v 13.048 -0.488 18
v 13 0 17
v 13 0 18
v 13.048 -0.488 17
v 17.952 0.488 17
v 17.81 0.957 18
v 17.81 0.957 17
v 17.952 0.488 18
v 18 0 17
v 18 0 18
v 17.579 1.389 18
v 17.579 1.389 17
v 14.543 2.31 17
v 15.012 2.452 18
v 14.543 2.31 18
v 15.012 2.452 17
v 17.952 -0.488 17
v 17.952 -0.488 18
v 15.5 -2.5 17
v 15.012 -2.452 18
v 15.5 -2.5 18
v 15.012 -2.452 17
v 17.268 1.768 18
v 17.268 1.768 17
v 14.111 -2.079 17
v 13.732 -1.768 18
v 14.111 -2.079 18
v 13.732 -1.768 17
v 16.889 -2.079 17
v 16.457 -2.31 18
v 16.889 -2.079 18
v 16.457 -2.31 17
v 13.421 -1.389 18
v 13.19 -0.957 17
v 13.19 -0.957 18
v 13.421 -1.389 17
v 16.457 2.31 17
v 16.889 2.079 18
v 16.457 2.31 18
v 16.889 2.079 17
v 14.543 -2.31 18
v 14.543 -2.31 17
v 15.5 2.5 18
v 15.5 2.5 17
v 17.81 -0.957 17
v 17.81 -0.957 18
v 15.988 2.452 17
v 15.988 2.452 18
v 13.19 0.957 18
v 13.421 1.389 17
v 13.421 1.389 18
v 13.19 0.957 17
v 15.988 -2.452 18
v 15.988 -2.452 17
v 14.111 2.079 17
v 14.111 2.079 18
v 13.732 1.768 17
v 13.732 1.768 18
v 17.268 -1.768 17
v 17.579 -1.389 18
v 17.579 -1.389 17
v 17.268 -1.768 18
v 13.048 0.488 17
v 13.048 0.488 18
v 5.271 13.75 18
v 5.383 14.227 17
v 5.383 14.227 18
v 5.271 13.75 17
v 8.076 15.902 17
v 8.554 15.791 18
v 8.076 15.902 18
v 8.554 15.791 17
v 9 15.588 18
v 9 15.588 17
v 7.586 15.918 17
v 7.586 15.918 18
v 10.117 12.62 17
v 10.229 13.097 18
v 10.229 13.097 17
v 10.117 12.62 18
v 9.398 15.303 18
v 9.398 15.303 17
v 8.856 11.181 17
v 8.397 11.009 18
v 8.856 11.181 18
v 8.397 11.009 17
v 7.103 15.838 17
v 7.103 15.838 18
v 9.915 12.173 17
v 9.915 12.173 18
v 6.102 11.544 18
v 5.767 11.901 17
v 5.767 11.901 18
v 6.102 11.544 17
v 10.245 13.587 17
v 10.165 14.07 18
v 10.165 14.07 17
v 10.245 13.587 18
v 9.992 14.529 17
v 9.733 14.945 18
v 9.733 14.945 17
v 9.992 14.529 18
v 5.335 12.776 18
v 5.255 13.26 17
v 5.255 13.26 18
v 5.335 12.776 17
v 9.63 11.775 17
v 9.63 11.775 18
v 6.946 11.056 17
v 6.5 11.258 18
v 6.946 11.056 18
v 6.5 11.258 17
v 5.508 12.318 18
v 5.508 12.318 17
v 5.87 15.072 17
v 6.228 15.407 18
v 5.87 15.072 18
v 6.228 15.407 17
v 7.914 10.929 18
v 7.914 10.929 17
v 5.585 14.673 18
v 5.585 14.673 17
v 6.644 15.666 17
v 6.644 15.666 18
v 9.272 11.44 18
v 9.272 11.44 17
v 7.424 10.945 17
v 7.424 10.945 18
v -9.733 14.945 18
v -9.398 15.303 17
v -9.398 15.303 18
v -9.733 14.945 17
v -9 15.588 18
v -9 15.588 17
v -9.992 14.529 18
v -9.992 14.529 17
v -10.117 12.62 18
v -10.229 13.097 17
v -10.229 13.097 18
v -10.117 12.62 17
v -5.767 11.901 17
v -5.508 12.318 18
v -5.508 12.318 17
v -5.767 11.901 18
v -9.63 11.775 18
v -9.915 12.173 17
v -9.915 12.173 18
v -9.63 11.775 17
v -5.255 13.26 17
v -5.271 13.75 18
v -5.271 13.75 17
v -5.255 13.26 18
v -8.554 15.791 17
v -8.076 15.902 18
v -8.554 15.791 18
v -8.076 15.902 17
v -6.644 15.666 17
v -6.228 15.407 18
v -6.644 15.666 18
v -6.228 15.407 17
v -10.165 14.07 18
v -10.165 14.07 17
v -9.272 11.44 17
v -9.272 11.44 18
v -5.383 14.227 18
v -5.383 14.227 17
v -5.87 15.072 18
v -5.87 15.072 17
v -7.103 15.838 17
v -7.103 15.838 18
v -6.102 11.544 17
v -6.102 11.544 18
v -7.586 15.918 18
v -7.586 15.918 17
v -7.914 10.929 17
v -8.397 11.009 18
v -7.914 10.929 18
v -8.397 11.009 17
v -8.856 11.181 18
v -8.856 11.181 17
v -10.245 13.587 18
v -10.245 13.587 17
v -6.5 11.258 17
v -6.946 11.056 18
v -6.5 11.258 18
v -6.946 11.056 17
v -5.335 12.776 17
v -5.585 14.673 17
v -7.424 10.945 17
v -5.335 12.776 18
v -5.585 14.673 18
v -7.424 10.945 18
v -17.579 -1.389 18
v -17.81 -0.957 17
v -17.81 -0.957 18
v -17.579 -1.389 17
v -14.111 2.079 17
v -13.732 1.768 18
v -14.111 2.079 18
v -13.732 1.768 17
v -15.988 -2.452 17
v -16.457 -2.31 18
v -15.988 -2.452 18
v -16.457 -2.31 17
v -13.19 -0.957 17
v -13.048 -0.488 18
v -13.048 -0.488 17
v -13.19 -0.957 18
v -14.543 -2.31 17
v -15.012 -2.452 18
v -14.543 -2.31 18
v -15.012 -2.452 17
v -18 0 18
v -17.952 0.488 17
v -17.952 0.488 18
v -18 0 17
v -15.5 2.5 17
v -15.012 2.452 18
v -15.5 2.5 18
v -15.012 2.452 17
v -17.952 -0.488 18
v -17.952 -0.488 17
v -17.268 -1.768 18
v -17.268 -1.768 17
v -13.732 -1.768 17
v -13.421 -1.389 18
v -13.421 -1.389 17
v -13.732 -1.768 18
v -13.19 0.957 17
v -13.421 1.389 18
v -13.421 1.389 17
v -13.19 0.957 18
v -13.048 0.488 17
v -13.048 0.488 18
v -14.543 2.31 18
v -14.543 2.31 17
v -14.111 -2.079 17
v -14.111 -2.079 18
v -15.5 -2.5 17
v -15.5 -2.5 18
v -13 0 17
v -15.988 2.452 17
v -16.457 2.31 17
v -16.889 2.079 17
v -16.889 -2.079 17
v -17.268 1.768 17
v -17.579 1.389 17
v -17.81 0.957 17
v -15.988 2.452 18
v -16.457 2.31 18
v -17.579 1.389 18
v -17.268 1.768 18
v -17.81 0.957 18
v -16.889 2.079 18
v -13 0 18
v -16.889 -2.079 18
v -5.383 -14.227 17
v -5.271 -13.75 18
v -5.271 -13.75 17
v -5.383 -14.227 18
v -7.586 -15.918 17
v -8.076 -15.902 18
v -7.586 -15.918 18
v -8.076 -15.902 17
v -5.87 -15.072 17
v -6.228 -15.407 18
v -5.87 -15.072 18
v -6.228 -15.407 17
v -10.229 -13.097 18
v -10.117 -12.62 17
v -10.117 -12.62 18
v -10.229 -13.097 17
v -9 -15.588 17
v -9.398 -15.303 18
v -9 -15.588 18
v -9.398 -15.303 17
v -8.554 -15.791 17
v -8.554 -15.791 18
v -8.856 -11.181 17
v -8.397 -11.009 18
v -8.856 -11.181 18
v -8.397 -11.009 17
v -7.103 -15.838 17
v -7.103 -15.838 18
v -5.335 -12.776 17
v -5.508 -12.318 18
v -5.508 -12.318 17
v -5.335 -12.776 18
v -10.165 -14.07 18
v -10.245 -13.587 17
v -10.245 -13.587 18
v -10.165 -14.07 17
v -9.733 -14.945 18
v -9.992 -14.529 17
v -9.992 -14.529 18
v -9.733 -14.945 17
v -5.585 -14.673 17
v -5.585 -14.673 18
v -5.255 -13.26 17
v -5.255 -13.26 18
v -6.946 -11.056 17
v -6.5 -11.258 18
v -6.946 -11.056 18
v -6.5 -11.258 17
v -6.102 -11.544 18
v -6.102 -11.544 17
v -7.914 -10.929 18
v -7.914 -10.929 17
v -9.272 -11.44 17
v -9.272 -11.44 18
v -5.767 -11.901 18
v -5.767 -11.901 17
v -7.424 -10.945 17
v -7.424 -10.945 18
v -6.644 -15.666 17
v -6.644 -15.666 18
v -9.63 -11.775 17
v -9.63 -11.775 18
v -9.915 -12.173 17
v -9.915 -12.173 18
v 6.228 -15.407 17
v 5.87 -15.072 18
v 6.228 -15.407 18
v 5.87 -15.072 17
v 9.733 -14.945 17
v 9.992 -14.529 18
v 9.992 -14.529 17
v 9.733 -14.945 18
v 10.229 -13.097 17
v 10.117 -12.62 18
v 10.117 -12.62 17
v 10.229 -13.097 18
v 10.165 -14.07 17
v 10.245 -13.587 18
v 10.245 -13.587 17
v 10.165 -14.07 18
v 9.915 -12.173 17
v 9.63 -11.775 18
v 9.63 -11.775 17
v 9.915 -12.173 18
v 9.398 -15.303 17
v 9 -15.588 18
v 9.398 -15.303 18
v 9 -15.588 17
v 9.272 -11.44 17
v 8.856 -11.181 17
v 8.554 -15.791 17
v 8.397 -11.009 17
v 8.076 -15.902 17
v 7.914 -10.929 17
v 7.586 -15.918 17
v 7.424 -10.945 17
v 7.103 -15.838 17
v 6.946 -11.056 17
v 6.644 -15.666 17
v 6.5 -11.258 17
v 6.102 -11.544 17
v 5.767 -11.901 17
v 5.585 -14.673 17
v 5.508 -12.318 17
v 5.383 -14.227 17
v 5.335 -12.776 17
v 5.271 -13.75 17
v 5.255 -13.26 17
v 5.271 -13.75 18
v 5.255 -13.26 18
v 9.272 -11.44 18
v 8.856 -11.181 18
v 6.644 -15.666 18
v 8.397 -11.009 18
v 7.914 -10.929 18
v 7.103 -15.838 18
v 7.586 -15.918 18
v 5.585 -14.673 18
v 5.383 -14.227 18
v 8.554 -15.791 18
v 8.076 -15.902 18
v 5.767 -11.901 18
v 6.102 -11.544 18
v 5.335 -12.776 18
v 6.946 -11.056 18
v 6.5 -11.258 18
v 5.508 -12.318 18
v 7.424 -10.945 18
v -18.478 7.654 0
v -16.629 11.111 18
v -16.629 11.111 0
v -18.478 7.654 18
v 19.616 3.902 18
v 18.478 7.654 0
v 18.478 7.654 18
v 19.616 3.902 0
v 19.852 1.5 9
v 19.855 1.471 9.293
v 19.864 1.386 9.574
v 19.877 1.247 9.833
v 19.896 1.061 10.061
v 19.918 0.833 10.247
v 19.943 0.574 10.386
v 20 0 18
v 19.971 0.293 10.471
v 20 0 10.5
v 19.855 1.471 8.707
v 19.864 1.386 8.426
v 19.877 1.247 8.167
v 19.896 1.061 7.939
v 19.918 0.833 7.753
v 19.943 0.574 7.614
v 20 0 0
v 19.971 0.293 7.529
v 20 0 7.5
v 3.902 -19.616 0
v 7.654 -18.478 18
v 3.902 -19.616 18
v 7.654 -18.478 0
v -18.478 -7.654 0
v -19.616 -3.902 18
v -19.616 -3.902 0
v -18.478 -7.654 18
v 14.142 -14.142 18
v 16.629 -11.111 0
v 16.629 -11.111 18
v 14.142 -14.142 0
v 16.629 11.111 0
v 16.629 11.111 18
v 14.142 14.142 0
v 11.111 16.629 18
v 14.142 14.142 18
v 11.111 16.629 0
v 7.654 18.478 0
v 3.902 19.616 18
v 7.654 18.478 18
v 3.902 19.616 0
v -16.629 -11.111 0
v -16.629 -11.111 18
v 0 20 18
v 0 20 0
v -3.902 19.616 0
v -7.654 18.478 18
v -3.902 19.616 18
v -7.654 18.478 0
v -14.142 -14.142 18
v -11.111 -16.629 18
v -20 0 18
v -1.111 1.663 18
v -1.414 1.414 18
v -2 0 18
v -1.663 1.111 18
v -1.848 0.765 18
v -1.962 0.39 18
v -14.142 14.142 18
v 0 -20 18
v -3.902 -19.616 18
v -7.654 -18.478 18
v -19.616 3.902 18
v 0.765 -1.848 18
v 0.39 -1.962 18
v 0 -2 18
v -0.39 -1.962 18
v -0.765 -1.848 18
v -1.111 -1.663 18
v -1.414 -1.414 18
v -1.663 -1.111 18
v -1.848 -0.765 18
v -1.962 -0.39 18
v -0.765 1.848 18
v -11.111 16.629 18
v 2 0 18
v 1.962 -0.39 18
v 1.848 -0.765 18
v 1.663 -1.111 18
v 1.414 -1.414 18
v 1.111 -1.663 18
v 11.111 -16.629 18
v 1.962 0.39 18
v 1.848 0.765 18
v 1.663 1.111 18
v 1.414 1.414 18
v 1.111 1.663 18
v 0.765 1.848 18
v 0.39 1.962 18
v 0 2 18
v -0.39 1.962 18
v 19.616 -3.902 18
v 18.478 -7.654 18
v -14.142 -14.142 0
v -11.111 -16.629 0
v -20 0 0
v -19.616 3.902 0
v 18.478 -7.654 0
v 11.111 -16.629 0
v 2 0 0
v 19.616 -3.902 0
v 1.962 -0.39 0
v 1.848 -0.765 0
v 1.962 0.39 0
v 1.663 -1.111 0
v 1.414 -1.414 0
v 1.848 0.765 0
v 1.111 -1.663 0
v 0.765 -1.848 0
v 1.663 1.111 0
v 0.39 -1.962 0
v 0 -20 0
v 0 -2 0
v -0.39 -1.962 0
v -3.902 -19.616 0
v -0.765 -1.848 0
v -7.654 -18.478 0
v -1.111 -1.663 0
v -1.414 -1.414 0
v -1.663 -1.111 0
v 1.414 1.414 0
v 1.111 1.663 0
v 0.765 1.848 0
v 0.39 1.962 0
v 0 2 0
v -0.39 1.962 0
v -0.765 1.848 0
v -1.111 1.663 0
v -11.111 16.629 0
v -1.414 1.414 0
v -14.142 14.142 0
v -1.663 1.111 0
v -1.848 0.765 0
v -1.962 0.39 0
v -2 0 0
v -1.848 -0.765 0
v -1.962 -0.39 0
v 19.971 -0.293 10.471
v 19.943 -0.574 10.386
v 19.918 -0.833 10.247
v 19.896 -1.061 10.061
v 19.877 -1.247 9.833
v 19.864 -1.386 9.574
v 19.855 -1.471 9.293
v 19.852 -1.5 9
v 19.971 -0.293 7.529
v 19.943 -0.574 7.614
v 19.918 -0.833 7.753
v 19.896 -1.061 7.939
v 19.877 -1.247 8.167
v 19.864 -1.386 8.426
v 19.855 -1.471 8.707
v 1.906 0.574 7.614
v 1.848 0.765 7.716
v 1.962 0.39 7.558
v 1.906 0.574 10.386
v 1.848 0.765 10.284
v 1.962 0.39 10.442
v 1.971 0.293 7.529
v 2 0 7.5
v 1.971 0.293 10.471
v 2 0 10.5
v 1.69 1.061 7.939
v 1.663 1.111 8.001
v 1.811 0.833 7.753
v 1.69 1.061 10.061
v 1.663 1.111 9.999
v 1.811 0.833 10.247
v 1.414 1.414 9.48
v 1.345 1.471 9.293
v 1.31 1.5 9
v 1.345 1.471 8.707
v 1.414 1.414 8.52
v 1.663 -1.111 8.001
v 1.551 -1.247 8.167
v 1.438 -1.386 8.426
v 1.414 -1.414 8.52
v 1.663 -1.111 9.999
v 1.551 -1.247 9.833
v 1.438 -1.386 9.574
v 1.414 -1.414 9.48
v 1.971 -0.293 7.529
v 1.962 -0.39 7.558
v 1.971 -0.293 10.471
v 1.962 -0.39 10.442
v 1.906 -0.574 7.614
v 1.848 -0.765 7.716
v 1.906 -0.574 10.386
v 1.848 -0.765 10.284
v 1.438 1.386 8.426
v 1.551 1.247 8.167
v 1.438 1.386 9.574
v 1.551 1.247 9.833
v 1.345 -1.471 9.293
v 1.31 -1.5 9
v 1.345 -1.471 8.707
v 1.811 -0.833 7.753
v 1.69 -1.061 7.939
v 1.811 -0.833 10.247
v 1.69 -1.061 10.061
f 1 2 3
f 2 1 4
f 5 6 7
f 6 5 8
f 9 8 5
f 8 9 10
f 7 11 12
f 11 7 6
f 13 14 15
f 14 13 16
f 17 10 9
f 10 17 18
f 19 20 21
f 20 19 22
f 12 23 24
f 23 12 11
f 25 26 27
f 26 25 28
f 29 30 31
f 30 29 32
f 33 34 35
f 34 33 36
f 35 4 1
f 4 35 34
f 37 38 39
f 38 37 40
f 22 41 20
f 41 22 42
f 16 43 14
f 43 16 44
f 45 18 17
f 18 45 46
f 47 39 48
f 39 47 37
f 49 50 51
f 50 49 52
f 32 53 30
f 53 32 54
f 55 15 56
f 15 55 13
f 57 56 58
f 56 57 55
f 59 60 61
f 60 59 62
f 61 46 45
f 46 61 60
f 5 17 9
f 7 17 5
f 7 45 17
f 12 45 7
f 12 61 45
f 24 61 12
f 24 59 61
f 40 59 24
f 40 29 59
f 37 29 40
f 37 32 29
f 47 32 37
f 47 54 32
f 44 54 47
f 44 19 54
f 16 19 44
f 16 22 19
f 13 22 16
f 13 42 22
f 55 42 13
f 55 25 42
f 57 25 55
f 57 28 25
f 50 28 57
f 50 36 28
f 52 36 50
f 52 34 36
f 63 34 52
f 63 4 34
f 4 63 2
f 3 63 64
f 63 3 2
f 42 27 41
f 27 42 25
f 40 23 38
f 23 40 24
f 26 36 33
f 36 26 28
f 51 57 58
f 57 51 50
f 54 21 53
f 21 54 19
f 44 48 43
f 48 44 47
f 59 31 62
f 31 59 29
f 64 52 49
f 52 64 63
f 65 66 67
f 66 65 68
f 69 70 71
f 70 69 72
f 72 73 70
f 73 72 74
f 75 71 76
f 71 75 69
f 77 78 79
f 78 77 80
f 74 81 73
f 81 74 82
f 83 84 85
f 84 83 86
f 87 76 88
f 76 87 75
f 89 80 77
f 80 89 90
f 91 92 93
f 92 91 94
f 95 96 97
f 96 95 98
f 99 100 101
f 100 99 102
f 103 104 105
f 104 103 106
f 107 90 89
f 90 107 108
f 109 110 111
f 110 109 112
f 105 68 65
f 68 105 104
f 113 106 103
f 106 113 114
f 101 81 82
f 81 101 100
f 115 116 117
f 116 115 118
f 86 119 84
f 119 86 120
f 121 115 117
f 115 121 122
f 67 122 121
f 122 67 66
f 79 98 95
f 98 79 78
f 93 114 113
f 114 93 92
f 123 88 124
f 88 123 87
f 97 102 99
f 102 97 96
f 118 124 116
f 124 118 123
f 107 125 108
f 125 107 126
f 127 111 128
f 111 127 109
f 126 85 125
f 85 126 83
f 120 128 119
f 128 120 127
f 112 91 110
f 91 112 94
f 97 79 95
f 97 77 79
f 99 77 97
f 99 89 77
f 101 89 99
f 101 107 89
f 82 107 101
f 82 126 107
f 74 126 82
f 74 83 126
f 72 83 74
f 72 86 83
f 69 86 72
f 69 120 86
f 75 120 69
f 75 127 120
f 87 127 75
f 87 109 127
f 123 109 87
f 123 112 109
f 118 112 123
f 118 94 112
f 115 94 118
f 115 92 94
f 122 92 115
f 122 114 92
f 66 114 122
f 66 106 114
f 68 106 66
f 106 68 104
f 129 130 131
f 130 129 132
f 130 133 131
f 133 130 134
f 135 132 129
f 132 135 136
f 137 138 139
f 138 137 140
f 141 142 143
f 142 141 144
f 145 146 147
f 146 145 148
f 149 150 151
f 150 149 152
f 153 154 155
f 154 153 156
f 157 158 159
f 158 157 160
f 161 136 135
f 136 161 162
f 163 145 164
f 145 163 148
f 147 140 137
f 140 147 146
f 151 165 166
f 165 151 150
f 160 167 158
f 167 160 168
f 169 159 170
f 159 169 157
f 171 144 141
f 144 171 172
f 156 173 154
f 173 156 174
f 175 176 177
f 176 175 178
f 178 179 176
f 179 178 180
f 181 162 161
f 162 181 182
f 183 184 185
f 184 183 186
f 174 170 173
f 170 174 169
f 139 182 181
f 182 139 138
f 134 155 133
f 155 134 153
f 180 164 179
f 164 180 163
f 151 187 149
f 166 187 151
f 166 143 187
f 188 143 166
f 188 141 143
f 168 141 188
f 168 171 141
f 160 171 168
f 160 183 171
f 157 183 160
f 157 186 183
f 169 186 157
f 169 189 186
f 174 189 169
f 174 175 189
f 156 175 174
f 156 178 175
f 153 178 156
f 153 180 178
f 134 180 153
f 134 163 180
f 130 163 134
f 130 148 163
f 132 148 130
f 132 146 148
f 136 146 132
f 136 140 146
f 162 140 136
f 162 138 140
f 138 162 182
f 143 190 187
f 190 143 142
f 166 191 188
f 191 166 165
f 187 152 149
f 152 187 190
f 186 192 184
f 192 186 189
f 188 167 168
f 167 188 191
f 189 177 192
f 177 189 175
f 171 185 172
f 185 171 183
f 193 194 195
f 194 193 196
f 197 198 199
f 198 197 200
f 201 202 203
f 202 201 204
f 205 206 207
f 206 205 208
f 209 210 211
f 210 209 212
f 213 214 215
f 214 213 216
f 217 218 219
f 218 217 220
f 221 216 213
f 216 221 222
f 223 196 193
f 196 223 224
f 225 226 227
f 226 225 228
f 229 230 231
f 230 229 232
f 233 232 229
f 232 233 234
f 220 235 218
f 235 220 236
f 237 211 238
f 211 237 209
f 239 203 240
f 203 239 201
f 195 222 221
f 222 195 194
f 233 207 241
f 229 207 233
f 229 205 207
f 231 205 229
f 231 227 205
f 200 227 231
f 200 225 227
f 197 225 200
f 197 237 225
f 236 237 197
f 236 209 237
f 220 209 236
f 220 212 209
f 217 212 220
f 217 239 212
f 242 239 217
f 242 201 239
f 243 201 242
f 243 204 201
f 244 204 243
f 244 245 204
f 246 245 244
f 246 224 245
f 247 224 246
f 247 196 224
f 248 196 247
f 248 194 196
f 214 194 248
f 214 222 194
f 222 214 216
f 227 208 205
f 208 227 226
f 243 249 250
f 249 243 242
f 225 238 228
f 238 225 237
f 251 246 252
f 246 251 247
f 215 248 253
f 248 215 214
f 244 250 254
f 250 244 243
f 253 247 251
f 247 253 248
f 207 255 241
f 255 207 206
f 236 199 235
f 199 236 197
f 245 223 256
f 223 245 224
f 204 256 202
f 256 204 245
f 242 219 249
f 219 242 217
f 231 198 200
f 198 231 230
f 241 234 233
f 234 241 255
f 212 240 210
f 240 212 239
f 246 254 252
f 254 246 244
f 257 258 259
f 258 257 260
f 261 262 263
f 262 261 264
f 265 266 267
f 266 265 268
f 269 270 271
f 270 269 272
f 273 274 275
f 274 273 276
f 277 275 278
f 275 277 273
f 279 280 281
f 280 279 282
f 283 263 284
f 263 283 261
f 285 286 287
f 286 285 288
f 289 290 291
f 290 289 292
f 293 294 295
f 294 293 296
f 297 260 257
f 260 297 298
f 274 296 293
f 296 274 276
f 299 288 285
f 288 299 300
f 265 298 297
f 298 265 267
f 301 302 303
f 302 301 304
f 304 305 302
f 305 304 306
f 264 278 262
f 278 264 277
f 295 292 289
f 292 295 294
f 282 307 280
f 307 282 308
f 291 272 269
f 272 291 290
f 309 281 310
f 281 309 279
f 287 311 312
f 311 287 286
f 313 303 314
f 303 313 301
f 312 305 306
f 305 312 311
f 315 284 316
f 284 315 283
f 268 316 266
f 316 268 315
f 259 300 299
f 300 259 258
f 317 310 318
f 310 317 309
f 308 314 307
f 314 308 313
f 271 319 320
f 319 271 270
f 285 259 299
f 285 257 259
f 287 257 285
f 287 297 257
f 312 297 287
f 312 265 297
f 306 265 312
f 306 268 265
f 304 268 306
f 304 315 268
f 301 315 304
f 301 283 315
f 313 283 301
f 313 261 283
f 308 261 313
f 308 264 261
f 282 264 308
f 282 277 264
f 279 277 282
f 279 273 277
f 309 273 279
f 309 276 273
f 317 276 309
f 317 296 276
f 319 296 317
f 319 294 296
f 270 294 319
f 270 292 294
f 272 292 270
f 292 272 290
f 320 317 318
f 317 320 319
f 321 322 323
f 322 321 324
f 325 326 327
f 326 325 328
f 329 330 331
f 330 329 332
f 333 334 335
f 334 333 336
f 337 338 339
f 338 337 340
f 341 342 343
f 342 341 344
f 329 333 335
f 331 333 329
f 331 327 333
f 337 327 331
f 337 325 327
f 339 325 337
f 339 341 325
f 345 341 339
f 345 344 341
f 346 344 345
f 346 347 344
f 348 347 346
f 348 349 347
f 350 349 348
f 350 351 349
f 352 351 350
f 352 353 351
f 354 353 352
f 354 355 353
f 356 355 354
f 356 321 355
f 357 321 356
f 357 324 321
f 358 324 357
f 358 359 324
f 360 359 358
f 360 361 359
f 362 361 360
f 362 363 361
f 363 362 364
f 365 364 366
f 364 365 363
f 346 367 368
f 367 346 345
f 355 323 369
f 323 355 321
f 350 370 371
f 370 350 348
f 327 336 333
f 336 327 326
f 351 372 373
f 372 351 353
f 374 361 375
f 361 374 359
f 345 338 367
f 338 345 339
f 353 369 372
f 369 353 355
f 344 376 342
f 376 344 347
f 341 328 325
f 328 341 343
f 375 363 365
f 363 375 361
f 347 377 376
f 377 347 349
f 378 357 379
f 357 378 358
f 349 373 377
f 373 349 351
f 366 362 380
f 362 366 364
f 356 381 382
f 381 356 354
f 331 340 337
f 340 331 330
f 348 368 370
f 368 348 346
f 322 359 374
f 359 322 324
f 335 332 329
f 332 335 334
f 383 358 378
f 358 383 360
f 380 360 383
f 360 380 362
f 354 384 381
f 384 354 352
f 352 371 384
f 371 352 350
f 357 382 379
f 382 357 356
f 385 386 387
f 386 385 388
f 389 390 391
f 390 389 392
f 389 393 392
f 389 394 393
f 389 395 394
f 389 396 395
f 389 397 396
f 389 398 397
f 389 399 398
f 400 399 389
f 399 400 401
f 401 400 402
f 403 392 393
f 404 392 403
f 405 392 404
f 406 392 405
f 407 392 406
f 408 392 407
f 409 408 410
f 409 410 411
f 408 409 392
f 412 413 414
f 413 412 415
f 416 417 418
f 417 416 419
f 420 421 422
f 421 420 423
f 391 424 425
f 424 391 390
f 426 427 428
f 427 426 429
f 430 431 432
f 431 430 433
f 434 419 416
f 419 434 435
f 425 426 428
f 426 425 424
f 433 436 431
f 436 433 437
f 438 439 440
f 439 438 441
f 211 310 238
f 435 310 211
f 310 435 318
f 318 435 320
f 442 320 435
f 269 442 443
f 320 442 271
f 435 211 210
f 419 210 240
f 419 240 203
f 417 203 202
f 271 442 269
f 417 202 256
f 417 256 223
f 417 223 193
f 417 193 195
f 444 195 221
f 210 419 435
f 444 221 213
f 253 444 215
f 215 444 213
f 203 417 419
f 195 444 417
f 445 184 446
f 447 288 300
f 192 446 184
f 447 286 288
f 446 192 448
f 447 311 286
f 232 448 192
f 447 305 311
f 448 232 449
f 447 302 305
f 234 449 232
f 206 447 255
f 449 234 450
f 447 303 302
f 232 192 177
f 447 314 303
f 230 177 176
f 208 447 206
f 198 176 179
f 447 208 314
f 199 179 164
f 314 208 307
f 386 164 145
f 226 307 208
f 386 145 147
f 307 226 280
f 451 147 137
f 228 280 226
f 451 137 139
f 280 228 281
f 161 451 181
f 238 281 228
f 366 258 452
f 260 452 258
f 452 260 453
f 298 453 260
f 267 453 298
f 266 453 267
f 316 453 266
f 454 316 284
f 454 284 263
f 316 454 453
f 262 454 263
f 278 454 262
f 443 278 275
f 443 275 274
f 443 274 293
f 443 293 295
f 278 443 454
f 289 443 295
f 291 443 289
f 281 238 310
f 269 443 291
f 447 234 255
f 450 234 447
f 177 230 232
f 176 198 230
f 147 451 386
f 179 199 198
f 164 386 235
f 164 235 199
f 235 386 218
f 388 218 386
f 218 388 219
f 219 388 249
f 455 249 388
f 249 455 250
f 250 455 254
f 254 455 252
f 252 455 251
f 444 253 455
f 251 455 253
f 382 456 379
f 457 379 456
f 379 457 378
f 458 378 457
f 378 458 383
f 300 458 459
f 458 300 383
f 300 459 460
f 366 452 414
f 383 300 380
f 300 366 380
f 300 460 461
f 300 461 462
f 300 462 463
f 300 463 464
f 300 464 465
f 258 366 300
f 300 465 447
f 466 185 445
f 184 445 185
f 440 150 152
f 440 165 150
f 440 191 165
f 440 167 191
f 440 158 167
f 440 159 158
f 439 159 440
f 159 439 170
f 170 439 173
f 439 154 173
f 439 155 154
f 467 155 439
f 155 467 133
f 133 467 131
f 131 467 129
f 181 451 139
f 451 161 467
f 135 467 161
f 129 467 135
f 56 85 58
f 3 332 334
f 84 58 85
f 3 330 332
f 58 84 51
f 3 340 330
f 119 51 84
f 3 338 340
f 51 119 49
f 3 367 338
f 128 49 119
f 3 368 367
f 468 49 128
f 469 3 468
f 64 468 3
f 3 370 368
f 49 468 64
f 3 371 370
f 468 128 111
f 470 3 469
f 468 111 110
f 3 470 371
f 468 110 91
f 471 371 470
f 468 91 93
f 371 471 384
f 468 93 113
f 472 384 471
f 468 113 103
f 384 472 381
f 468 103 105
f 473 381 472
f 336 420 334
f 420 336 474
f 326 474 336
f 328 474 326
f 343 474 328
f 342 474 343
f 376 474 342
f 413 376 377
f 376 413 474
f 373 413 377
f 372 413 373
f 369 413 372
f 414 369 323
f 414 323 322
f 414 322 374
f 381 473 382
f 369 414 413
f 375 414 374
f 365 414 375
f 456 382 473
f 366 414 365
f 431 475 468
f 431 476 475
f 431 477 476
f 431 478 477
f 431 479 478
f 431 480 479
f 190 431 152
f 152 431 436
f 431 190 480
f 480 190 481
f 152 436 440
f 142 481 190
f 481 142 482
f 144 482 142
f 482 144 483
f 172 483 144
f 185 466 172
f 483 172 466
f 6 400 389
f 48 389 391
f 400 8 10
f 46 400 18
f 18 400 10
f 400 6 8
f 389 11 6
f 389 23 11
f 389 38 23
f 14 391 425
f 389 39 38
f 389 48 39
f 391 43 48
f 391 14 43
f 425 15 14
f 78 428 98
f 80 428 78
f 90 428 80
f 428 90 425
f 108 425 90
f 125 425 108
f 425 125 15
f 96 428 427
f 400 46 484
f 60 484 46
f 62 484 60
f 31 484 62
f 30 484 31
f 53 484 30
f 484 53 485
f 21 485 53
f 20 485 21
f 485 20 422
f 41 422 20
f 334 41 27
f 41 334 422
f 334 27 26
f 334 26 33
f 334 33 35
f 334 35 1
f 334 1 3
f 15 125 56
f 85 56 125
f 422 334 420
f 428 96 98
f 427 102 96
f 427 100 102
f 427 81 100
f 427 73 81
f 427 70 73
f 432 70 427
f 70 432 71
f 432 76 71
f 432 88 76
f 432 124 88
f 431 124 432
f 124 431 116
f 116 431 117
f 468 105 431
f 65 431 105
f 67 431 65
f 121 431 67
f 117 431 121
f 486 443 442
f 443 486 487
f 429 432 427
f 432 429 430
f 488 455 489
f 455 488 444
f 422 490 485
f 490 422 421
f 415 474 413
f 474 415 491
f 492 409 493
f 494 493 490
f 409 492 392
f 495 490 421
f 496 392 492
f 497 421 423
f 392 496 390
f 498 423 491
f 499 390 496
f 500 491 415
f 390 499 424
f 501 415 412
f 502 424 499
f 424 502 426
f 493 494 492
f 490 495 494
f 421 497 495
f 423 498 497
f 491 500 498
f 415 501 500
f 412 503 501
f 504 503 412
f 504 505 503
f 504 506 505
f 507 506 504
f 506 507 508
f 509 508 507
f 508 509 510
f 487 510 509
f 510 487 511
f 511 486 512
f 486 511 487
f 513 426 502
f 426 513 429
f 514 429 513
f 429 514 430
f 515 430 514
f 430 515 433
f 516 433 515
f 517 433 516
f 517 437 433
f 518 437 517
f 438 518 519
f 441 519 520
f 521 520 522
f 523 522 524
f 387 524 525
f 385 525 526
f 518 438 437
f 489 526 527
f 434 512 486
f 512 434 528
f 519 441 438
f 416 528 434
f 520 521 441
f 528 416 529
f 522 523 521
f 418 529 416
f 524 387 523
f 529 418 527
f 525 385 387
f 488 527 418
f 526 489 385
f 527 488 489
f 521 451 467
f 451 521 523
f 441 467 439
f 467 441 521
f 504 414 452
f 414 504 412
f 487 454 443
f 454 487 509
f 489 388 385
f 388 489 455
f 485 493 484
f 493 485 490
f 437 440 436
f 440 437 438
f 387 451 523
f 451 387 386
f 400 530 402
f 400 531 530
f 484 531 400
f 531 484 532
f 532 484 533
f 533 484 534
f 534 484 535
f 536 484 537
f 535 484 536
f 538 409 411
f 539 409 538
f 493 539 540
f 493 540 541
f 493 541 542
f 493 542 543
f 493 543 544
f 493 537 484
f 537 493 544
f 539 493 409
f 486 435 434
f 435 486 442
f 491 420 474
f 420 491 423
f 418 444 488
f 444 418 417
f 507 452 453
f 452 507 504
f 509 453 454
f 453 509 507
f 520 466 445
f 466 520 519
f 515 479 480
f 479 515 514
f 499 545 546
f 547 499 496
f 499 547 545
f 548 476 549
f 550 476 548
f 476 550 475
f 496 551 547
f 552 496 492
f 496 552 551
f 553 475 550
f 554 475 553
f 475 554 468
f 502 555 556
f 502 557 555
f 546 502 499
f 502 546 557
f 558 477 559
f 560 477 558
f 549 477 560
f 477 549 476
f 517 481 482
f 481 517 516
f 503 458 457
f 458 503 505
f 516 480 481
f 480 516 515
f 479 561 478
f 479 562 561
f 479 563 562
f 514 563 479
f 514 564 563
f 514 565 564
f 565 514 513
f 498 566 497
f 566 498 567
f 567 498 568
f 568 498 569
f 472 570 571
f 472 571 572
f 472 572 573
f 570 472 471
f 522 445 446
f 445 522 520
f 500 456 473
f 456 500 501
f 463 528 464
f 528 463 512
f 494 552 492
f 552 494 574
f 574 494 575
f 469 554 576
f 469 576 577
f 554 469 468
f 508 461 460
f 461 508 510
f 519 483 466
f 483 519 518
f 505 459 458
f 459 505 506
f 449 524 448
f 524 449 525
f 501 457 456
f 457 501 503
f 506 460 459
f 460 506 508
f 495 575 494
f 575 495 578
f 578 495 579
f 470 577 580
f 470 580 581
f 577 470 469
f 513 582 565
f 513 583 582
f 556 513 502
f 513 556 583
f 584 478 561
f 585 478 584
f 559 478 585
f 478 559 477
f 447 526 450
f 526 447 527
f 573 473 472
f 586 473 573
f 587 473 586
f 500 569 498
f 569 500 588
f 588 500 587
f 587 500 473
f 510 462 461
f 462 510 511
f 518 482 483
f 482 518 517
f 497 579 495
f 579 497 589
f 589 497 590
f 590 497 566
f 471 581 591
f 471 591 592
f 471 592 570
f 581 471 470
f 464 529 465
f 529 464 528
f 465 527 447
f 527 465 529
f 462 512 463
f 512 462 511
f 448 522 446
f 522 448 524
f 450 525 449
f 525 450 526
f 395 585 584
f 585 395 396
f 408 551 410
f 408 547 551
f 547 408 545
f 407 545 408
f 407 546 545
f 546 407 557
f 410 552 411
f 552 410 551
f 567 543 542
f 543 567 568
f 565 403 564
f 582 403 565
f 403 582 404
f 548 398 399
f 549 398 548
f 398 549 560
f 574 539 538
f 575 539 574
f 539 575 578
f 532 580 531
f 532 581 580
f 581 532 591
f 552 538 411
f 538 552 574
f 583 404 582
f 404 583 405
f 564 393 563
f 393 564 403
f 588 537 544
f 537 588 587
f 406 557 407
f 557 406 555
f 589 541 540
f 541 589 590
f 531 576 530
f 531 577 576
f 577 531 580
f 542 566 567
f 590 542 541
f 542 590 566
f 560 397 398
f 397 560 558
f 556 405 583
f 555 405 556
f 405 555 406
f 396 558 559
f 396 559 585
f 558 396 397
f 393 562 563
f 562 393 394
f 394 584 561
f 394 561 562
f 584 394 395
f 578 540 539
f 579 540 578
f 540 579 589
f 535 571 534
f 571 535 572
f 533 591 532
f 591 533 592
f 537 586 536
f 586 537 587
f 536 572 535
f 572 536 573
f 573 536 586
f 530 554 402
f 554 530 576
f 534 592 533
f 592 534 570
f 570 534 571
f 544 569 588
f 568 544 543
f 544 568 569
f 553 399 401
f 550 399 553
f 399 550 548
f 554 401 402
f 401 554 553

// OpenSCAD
$fn = 32;

// ----------------------------------------------------------------------
// Control knob: dimpled knob
// ----------------------------------------------------------------------

// --- parameters (mm) ---
dimp_d = 5;               // finger dimple diameter
n_dimp = 6;               // number of dimples
dimp_r = 15.5;            // dimple ring radius
knob_d = 40;              // knob body diameter
knob_h = 18;              // knob body height
bore_d = 4;               // shaft bore diameter
set_d = 3;                // set screw bore diameter

dimp_step = 360 / n_dimp;  // dimple angular step

difference() {
  cylinder(h = knob_h, d = knob_d);
  translate([0, 0, -1]) cylinder(h = knob_h + 2, d = bore_d);
  translate([-1, 0, knob_h / 2]) rotate([0, 90, 0])
    cylinder(h = knob_d / 2 + bore_d / 2 + 2, d = set_d);  for (i = [0 : n_dimp - 1])
    rotate([0, 0, i * dimp_step])
      translate([dimp_r, 0, knob_h - 1])
        cylinder(h = 2, d = dimp_d);
}
